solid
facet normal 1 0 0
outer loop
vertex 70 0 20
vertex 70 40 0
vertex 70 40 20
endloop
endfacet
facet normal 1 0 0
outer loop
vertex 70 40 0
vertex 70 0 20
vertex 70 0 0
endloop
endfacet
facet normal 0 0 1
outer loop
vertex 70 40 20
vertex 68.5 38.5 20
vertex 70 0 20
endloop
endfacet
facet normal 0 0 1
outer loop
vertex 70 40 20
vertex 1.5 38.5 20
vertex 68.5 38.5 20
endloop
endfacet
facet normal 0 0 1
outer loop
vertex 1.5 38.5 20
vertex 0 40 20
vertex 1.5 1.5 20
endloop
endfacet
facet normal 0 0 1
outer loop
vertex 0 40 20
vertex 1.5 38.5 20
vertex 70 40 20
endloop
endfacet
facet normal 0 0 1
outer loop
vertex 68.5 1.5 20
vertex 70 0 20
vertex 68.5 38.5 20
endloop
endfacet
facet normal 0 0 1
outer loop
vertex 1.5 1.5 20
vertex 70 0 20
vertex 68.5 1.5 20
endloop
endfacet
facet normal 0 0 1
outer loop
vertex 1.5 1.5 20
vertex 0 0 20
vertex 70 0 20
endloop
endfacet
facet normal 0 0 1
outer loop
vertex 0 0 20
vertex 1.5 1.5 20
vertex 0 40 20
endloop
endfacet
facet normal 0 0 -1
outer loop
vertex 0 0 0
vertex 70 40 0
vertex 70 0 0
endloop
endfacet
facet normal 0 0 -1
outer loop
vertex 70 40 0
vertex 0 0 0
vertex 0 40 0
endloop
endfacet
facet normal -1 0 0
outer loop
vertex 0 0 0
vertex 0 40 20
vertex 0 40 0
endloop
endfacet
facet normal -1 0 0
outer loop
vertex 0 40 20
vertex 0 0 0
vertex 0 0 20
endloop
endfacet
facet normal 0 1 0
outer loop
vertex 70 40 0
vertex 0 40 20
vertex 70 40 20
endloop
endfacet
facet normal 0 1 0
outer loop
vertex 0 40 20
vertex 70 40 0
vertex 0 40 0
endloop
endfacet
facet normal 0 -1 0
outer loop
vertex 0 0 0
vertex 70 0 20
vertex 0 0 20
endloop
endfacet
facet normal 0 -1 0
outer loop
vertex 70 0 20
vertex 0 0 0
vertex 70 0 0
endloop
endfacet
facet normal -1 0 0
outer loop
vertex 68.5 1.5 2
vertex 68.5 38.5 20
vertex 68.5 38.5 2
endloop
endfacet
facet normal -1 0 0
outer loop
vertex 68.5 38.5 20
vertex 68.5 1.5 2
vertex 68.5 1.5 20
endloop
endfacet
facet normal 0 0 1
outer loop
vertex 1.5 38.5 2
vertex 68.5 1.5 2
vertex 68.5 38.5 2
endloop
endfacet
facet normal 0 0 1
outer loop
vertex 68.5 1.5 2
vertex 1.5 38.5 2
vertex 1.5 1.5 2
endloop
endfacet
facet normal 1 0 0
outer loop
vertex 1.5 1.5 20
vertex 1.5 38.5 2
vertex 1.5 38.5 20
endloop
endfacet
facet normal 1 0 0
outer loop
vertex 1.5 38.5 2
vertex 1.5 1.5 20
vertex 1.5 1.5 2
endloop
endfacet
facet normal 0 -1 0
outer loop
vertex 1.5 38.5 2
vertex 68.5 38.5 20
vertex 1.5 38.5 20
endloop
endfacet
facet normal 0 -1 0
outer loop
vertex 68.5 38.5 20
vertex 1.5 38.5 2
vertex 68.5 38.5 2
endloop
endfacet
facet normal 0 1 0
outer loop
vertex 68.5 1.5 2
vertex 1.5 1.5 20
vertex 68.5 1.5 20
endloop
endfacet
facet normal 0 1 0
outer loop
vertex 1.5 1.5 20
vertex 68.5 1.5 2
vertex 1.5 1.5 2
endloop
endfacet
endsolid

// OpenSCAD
$fn = 32;

// ----------------------------------------------------------------------
// Open box: 1.5 mm walls
// ----------------------------------------------------------------------

// --- parameters (mm) ---
box_l = 70;               // outer length, X
box_w = 40;               // outer width, Y
box_h = 20;               // outer height, Z
wall = 1.5;               // wall thickness
floor = 2;                // floor thickness

difference() {
  cube([box_l, box_w, box_h]);
  translate([wall, wall, floor])
    cube([box_l - 2 * wall, box_w - 2 * wall, box_h]);
}
